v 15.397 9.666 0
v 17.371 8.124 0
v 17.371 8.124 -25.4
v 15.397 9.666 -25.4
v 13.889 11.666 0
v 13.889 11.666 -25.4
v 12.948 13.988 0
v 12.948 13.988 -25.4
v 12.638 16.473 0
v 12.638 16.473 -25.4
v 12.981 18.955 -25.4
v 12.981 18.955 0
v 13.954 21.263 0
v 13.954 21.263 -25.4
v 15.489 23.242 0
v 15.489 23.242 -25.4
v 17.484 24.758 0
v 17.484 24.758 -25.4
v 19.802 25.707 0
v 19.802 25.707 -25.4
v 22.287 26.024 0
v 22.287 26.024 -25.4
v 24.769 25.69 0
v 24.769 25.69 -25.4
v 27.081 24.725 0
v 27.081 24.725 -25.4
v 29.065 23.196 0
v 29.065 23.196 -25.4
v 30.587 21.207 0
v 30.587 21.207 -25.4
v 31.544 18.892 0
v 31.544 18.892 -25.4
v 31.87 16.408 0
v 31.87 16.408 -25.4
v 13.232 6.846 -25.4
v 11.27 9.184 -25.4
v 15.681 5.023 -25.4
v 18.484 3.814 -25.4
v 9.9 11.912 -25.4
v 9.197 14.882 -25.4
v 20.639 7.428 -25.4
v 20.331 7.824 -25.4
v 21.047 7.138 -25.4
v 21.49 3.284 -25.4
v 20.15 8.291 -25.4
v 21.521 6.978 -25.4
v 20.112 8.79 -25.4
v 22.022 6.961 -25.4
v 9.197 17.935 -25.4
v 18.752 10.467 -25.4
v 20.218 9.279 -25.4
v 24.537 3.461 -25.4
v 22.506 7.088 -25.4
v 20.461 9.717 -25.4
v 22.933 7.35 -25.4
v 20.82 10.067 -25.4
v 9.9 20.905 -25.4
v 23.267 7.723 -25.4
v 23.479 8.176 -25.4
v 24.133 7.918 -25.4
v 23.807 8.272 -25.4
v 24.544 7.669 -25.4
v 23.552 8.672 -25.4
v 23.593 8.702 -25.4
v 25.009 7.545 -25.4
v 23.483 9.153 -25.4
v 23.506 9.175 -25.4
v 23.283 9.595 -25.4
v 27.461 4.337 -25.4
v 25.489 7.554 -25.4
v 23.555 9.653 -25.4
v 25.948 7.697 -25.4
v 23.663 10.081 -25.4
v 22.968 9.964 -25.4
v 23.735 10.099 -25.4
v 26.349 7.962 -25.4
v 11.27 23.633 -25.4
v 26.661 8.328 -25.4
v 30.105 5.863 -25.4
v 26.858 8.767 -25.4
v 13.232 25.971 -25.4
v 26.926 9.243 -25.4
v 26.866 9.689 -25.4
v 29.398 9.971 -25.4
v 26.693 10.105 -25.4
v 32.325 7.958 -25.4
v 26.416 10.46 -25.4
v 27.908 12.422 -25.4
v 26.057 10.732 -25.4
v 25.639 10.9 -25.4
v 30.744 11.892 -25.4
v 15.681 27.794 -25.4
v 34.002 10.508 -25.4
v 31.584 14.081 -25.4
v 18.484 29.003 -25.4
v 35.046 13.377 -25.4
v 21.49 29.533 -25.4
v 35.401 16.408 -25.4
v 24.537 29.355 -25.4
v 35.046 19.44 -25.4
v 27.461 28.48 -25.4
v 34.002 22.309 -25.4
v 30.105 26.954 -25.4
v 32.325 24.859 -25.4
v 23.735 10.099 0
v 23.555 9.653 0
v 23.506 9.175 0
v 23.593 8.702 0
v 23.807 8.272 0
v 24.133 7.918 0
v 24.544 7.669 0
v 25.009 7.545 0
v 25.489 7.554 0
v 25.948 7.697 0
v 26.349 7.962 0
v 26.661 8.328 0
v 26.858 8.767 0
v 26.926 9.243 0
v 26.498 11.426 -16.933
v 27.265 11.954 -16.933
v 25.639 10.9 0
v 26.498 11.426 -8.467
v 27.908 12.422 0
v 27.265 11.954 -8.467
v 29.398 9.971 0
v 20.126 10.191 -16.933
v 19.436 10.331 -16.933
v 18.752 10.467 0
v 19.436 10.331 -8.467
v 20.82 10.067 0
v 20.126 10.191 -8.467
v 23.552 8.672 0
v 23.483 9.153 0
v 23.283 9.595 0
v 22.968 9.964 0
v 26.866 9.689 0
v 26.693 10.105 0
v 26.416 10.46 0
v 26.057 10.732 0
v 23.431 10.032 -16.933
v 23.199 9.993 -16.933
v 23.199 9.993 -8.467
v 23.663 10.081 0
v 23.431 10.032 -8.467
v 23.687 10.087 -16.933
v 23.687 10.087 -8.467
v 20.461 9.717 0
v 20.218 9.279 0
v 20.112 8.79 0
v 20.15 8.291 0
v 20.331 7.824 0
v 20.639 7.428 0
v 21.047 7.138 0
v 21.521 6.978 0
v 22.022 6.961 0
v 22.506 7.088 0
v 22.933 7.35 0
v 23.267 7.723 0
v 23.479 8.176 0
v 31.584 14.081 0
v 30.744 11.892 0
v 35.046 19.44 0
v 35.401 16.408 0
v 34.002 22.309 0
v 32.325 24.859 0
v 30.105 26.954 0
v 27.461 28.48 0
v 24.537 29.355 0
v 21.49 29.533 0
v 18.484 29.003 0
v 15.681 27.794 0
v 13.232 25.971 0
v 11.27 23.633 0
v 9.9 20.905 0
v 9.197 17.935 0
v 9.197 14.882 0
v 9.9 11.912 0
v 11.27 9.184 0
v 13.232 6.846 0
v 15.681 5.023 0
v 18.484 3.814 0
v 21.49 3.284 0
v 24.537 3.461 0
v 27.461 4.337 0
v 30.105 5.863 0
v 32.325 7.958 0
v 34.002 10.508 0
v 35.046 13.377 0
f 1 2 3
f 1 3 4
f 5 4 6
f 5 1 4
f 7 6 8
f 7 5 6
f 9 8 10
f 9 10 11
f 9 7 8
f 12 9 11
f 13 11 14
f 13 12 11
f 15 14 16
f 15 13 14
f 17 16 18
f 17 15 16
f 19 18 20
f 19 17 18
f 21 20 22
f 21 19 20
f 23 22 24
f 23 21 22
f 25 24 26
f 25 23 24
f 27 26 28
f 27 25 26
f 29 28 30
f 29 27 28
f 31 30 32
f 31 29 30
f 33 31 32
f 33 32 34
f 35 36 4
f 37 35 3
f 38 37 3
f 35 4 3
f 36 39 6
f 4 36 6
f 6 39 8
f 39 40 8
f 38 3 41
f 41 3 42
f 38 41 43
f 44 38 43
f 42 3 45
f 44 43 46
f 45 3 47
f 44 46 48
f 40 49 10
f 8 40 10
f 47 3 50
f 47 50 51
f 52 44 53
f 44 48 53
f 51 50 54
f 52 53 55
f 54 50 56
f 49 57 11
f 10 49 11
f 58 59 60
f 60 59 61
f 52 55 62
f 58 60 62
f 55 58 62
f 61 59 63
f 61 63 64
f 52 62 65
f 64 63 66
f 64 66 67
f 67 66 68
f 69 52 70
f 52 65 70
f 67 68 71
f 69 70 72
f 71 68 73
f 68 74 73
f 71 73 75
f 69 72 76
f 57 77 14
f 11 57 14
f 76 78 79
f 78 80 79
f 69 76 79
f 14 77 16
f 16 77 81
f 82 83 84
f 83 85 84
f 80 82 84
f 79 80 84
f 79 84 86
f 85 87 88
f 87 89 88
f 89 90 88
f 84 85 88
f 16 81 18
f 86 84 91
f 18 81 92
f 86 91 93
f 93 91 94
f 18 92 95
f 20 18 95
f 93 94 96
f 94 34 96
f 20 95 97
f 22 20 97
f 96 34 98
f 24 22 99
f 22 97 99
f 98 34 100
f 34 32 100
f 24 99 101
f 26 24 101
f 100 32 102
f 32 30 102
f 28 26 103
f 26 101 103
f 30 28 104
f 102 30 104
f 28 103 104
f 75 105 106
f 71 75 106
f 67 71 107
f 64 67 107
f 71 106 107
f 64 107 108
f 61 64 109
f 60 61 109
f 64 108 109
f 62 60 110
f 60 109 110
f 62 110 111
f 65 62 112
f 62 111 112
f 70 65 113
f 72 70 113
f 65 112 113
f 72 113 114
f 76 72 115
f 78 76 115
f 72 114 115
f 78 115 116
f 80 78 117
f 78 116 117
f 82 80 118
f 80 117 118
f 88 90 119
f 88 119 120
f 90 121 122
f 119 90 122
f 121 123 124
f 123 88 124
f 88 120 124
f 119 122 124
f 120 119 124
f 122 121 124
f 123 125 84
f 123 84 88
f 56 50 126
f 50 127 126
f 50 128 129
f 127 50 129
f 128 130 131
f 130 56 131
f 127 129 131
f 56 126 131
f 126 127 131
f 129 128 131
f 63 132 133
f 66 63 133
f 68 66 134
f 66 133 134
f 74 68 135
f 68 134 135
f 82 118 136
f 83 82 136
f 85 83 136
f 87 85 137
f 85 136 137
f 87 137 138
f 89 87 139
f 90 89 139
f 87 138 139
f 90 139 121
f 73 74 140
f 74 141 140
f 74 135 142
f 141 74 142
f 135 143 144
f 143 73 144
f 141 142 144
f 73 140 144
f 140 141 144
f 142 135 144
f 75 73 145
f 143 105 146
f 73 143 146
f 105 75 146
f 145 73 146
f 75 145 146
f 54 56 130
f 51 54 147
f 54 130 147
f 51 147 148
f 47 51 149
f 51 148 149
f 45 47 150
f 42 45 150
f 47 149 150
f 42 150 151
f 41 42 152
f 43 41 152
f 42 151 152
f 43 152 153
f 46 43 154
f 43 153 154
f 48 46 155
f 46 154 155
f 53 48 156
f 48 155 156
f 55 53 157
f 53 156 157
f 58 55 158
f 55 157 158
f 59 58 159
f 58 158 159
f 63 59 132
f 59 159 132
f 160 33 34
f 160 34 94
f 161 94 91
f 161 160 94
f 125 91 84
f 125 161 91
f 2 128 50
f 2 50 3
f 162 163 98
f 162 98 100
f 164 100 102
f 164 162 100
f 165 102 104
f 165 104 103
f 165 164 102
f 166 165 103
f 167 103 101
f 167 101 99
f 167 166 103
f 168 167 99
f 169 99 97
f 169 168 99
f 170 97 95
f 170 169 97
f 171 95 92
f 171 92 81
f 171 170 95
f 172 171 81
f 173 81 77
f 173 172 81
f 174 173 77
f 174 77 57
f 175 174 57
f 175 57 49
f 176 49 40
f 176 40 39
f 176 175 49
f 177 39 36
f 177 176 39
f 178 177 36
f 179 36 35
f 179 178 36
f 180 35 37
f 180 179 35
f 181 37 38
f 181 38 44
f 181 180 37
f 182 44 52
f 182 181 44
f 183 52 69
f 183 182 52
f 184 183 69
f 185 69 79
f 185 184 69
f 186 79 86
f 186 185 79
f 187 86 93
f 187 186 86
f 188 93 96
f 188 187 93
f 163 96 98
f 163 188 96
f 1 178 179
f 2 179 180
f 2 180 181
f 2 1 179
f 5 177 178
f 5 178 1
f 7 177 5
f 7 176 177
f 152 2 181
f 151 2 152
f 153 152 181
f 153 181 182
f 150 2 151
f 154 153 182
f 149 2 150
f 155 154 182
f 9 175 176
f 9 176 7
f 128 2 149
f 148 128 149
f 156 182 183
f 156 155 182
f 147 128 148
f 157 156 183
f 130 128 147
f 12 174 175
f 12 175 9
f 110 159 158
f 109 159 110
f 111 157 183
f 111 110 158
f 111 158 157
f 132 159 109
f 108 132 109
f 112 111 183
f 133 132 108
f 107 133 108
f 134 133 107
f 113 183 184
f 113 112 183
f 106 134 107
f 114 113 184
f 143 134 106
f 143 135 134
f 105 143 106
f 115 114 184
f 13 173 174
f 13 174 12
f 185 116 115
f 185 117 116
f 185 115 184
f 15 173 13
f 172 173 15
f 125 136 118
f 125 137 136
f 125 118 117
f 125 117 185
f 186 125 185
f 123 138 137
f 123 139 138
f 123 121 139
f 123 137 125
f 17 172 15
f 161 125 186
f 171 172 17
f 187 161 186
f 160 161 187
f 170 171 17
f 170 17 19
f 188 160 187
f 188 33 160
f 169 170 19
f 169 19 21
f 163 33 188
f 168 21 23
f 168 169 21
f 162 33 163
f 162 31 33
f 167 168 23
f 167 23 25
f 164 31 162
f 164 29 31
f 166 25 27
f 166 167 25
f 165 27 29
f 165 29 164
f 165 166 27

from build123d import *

# Parameters (mm, degrees)
F0_R     = 13.1466034644
F1_DEPTH = 25.4
F3_DEPTH = 25.4


with BuildPart() as f1:
    # F0 (on Top) → F1 (new body)
    with BuildSketch(Plane.XY):
        with Locations((22.2542323142, 16.408336586)):
            Circle(F0_R)
        with BuildLine():
            ThreePointArc((17.3713553391, 8.1242080796), (17.4837466767, 24.7576922166), (31.8703267742, 16.408336586))
            ThreePointArc((31.8703267742, 16.408336586), (31.2310278998, 12.9606687251), (29.3981352357, 9.9714177802))
            ThreePointArc((29.3981352357, 9.9714177802), (26.7985489054, 7.9337593468), (23.662805616, 6.895966013))
            ThreePointArc((23.662805616, 6.895966013), (20.4117228442, 6.9704114159), (17.3713553391, 8.1242080796))
        make_face(mode=Mode.SUBTRACT)
        with BuildLine():
            ThreePointArc((23.662805616, 6.895966013), (26.7985489054, 7.9337593468), (29.3981352357, 9.9714177802))
            Line((29.3981352357, 9.9714177802), (27.9079406361, 12.4224082931))
            add(Edge.make_bspline(
                [(23.662805616, 10.0813770912), (25.3011567226, 10.4707698937), (26.9352469675, 11.7126964633), (27.9079406361, 12.4224082931)],
                knots=[0.5019879856, 0.5019879856, 0.5019879856, 0.5019879856, 1, 1, 1, 1], degree=3))
            Line((23.662805616, 10.0813770912), (23.662805616, 6.895966013))
        make_face()
        with BuildLine():
            Line((18.7523793429, 10.4672079906), (17.3713553391, 8.1242080796))
            ThreePointArc((17.3713553391, 8.1242080796), (20.4117228442, 6.9704114159), (23.662805616, 6.895966013))
            Line((23.662805616, 6.895966013), (23.662805616, 10.0813770912))
            add(Edge.make_bspline(
                [(18.7523793429, 10.4672079906), (20.3556140754, 10.1625747365), (22.0113744297, 9.688875499), (23.662805616, 10.0813770912)],
                knots=[0, 0, 0, 0, 0.5019879856, 0.5019879856, 0.5019879856, 0.5019879856], degree=3))
        make_face()
    extrude(amount=-F1_DEPTH)

    # F2 (on face) → F3 (cut)
    with BuildSketch(Plane.XY):
        with BuildLine():
            add(Edge.make_bspline(
                [(22.9678027966, 9.964484064), (22.2495247463, 9.8906014768), (21.5319362459, 9.9530967079), (20.8197145148, 10.0668024382)],
                knots=[1.070410353, 1.070410353, 1.070410353, 1.070410353, 1.2887337185, 1.2887337185, 1.2887337185, 1.2887337185], degree=3))
            ThreePointArc((22.9678027966, 9.964484064), (21.9116925702, 10.3921507142), (20.8197145148, 10.0668024382))
        make_face()
        with BuildLine():
            ThreePointArc((20.8197145148, 10.0668024382), (21.046706191, 7.1381420291), (23.551896206, 8.6719607934))
            ThreePointArc((23.551896206, 8.6719607934), (23.3990939232, 9.3811472139), (22.9678027966, 9.964484064))
            add(Edge.make_bspline(
                [(22.9678027966, 9.964484064), (22.2495247463, 9.8906014768), (21.5319362459, 9.9530967079), (20.8197145148, 10.0668024382)],
                knots=[1.070410353, 1.070410353, 1.070410353, 1.070410353, 1.2887337185, 1.2887337185, 1.2887337185, 1.2887337185], degree=3))
        make_face()
        with BuildLine():
            ThreePointArc((25.6390406998, 10.8996020133), (24.5525965747, 10.8191970092), (23.735100283, 10.0991097821))
            add(Edge.make_bspline(
                [(25.6390406998, 10.8996020133), (25.0340333492, 10.5593442342), (24.3856651722, 10.2635991457), (23.735100283, 10.0991097821)],
                knots=[0.7948888634, 0.7948888634, 0.7948888634, 0.7948888634, 0.9926743355, 0.9926743355, 0.9926743355, 0.9926743355], degree=3))
        make_face()
        with BuildLine():
            add(Edge.make_bspline(
                [(25.6390406998, 10.8996020133), (25.0340333492, 10.5593442342), (24.3856651722, 10.2635991457), (23.735100283, 10.0991097821)],
                knots=[0.7948888634, 0.7948888634, 0.7948888634, 0.7948888634, 0.9926743355, 0.9926743355, 0.9926743355, 0.9926743355], degree=3))
            ThreePointArc((23.735100283, 10.0991097821), (24.7720390374, 7.5907286664), (26.9257952006, 9.2425616458))
            ThreePointArc((26.9257952006, 9.2425616458), (26.566331746, 10.2915516272), (25.6390406998, 10.8996020133))
        make_face()
    extrude(amount=-F3_DEPTH, mode=Mode.SUBTRACT)


solid = f1.part
